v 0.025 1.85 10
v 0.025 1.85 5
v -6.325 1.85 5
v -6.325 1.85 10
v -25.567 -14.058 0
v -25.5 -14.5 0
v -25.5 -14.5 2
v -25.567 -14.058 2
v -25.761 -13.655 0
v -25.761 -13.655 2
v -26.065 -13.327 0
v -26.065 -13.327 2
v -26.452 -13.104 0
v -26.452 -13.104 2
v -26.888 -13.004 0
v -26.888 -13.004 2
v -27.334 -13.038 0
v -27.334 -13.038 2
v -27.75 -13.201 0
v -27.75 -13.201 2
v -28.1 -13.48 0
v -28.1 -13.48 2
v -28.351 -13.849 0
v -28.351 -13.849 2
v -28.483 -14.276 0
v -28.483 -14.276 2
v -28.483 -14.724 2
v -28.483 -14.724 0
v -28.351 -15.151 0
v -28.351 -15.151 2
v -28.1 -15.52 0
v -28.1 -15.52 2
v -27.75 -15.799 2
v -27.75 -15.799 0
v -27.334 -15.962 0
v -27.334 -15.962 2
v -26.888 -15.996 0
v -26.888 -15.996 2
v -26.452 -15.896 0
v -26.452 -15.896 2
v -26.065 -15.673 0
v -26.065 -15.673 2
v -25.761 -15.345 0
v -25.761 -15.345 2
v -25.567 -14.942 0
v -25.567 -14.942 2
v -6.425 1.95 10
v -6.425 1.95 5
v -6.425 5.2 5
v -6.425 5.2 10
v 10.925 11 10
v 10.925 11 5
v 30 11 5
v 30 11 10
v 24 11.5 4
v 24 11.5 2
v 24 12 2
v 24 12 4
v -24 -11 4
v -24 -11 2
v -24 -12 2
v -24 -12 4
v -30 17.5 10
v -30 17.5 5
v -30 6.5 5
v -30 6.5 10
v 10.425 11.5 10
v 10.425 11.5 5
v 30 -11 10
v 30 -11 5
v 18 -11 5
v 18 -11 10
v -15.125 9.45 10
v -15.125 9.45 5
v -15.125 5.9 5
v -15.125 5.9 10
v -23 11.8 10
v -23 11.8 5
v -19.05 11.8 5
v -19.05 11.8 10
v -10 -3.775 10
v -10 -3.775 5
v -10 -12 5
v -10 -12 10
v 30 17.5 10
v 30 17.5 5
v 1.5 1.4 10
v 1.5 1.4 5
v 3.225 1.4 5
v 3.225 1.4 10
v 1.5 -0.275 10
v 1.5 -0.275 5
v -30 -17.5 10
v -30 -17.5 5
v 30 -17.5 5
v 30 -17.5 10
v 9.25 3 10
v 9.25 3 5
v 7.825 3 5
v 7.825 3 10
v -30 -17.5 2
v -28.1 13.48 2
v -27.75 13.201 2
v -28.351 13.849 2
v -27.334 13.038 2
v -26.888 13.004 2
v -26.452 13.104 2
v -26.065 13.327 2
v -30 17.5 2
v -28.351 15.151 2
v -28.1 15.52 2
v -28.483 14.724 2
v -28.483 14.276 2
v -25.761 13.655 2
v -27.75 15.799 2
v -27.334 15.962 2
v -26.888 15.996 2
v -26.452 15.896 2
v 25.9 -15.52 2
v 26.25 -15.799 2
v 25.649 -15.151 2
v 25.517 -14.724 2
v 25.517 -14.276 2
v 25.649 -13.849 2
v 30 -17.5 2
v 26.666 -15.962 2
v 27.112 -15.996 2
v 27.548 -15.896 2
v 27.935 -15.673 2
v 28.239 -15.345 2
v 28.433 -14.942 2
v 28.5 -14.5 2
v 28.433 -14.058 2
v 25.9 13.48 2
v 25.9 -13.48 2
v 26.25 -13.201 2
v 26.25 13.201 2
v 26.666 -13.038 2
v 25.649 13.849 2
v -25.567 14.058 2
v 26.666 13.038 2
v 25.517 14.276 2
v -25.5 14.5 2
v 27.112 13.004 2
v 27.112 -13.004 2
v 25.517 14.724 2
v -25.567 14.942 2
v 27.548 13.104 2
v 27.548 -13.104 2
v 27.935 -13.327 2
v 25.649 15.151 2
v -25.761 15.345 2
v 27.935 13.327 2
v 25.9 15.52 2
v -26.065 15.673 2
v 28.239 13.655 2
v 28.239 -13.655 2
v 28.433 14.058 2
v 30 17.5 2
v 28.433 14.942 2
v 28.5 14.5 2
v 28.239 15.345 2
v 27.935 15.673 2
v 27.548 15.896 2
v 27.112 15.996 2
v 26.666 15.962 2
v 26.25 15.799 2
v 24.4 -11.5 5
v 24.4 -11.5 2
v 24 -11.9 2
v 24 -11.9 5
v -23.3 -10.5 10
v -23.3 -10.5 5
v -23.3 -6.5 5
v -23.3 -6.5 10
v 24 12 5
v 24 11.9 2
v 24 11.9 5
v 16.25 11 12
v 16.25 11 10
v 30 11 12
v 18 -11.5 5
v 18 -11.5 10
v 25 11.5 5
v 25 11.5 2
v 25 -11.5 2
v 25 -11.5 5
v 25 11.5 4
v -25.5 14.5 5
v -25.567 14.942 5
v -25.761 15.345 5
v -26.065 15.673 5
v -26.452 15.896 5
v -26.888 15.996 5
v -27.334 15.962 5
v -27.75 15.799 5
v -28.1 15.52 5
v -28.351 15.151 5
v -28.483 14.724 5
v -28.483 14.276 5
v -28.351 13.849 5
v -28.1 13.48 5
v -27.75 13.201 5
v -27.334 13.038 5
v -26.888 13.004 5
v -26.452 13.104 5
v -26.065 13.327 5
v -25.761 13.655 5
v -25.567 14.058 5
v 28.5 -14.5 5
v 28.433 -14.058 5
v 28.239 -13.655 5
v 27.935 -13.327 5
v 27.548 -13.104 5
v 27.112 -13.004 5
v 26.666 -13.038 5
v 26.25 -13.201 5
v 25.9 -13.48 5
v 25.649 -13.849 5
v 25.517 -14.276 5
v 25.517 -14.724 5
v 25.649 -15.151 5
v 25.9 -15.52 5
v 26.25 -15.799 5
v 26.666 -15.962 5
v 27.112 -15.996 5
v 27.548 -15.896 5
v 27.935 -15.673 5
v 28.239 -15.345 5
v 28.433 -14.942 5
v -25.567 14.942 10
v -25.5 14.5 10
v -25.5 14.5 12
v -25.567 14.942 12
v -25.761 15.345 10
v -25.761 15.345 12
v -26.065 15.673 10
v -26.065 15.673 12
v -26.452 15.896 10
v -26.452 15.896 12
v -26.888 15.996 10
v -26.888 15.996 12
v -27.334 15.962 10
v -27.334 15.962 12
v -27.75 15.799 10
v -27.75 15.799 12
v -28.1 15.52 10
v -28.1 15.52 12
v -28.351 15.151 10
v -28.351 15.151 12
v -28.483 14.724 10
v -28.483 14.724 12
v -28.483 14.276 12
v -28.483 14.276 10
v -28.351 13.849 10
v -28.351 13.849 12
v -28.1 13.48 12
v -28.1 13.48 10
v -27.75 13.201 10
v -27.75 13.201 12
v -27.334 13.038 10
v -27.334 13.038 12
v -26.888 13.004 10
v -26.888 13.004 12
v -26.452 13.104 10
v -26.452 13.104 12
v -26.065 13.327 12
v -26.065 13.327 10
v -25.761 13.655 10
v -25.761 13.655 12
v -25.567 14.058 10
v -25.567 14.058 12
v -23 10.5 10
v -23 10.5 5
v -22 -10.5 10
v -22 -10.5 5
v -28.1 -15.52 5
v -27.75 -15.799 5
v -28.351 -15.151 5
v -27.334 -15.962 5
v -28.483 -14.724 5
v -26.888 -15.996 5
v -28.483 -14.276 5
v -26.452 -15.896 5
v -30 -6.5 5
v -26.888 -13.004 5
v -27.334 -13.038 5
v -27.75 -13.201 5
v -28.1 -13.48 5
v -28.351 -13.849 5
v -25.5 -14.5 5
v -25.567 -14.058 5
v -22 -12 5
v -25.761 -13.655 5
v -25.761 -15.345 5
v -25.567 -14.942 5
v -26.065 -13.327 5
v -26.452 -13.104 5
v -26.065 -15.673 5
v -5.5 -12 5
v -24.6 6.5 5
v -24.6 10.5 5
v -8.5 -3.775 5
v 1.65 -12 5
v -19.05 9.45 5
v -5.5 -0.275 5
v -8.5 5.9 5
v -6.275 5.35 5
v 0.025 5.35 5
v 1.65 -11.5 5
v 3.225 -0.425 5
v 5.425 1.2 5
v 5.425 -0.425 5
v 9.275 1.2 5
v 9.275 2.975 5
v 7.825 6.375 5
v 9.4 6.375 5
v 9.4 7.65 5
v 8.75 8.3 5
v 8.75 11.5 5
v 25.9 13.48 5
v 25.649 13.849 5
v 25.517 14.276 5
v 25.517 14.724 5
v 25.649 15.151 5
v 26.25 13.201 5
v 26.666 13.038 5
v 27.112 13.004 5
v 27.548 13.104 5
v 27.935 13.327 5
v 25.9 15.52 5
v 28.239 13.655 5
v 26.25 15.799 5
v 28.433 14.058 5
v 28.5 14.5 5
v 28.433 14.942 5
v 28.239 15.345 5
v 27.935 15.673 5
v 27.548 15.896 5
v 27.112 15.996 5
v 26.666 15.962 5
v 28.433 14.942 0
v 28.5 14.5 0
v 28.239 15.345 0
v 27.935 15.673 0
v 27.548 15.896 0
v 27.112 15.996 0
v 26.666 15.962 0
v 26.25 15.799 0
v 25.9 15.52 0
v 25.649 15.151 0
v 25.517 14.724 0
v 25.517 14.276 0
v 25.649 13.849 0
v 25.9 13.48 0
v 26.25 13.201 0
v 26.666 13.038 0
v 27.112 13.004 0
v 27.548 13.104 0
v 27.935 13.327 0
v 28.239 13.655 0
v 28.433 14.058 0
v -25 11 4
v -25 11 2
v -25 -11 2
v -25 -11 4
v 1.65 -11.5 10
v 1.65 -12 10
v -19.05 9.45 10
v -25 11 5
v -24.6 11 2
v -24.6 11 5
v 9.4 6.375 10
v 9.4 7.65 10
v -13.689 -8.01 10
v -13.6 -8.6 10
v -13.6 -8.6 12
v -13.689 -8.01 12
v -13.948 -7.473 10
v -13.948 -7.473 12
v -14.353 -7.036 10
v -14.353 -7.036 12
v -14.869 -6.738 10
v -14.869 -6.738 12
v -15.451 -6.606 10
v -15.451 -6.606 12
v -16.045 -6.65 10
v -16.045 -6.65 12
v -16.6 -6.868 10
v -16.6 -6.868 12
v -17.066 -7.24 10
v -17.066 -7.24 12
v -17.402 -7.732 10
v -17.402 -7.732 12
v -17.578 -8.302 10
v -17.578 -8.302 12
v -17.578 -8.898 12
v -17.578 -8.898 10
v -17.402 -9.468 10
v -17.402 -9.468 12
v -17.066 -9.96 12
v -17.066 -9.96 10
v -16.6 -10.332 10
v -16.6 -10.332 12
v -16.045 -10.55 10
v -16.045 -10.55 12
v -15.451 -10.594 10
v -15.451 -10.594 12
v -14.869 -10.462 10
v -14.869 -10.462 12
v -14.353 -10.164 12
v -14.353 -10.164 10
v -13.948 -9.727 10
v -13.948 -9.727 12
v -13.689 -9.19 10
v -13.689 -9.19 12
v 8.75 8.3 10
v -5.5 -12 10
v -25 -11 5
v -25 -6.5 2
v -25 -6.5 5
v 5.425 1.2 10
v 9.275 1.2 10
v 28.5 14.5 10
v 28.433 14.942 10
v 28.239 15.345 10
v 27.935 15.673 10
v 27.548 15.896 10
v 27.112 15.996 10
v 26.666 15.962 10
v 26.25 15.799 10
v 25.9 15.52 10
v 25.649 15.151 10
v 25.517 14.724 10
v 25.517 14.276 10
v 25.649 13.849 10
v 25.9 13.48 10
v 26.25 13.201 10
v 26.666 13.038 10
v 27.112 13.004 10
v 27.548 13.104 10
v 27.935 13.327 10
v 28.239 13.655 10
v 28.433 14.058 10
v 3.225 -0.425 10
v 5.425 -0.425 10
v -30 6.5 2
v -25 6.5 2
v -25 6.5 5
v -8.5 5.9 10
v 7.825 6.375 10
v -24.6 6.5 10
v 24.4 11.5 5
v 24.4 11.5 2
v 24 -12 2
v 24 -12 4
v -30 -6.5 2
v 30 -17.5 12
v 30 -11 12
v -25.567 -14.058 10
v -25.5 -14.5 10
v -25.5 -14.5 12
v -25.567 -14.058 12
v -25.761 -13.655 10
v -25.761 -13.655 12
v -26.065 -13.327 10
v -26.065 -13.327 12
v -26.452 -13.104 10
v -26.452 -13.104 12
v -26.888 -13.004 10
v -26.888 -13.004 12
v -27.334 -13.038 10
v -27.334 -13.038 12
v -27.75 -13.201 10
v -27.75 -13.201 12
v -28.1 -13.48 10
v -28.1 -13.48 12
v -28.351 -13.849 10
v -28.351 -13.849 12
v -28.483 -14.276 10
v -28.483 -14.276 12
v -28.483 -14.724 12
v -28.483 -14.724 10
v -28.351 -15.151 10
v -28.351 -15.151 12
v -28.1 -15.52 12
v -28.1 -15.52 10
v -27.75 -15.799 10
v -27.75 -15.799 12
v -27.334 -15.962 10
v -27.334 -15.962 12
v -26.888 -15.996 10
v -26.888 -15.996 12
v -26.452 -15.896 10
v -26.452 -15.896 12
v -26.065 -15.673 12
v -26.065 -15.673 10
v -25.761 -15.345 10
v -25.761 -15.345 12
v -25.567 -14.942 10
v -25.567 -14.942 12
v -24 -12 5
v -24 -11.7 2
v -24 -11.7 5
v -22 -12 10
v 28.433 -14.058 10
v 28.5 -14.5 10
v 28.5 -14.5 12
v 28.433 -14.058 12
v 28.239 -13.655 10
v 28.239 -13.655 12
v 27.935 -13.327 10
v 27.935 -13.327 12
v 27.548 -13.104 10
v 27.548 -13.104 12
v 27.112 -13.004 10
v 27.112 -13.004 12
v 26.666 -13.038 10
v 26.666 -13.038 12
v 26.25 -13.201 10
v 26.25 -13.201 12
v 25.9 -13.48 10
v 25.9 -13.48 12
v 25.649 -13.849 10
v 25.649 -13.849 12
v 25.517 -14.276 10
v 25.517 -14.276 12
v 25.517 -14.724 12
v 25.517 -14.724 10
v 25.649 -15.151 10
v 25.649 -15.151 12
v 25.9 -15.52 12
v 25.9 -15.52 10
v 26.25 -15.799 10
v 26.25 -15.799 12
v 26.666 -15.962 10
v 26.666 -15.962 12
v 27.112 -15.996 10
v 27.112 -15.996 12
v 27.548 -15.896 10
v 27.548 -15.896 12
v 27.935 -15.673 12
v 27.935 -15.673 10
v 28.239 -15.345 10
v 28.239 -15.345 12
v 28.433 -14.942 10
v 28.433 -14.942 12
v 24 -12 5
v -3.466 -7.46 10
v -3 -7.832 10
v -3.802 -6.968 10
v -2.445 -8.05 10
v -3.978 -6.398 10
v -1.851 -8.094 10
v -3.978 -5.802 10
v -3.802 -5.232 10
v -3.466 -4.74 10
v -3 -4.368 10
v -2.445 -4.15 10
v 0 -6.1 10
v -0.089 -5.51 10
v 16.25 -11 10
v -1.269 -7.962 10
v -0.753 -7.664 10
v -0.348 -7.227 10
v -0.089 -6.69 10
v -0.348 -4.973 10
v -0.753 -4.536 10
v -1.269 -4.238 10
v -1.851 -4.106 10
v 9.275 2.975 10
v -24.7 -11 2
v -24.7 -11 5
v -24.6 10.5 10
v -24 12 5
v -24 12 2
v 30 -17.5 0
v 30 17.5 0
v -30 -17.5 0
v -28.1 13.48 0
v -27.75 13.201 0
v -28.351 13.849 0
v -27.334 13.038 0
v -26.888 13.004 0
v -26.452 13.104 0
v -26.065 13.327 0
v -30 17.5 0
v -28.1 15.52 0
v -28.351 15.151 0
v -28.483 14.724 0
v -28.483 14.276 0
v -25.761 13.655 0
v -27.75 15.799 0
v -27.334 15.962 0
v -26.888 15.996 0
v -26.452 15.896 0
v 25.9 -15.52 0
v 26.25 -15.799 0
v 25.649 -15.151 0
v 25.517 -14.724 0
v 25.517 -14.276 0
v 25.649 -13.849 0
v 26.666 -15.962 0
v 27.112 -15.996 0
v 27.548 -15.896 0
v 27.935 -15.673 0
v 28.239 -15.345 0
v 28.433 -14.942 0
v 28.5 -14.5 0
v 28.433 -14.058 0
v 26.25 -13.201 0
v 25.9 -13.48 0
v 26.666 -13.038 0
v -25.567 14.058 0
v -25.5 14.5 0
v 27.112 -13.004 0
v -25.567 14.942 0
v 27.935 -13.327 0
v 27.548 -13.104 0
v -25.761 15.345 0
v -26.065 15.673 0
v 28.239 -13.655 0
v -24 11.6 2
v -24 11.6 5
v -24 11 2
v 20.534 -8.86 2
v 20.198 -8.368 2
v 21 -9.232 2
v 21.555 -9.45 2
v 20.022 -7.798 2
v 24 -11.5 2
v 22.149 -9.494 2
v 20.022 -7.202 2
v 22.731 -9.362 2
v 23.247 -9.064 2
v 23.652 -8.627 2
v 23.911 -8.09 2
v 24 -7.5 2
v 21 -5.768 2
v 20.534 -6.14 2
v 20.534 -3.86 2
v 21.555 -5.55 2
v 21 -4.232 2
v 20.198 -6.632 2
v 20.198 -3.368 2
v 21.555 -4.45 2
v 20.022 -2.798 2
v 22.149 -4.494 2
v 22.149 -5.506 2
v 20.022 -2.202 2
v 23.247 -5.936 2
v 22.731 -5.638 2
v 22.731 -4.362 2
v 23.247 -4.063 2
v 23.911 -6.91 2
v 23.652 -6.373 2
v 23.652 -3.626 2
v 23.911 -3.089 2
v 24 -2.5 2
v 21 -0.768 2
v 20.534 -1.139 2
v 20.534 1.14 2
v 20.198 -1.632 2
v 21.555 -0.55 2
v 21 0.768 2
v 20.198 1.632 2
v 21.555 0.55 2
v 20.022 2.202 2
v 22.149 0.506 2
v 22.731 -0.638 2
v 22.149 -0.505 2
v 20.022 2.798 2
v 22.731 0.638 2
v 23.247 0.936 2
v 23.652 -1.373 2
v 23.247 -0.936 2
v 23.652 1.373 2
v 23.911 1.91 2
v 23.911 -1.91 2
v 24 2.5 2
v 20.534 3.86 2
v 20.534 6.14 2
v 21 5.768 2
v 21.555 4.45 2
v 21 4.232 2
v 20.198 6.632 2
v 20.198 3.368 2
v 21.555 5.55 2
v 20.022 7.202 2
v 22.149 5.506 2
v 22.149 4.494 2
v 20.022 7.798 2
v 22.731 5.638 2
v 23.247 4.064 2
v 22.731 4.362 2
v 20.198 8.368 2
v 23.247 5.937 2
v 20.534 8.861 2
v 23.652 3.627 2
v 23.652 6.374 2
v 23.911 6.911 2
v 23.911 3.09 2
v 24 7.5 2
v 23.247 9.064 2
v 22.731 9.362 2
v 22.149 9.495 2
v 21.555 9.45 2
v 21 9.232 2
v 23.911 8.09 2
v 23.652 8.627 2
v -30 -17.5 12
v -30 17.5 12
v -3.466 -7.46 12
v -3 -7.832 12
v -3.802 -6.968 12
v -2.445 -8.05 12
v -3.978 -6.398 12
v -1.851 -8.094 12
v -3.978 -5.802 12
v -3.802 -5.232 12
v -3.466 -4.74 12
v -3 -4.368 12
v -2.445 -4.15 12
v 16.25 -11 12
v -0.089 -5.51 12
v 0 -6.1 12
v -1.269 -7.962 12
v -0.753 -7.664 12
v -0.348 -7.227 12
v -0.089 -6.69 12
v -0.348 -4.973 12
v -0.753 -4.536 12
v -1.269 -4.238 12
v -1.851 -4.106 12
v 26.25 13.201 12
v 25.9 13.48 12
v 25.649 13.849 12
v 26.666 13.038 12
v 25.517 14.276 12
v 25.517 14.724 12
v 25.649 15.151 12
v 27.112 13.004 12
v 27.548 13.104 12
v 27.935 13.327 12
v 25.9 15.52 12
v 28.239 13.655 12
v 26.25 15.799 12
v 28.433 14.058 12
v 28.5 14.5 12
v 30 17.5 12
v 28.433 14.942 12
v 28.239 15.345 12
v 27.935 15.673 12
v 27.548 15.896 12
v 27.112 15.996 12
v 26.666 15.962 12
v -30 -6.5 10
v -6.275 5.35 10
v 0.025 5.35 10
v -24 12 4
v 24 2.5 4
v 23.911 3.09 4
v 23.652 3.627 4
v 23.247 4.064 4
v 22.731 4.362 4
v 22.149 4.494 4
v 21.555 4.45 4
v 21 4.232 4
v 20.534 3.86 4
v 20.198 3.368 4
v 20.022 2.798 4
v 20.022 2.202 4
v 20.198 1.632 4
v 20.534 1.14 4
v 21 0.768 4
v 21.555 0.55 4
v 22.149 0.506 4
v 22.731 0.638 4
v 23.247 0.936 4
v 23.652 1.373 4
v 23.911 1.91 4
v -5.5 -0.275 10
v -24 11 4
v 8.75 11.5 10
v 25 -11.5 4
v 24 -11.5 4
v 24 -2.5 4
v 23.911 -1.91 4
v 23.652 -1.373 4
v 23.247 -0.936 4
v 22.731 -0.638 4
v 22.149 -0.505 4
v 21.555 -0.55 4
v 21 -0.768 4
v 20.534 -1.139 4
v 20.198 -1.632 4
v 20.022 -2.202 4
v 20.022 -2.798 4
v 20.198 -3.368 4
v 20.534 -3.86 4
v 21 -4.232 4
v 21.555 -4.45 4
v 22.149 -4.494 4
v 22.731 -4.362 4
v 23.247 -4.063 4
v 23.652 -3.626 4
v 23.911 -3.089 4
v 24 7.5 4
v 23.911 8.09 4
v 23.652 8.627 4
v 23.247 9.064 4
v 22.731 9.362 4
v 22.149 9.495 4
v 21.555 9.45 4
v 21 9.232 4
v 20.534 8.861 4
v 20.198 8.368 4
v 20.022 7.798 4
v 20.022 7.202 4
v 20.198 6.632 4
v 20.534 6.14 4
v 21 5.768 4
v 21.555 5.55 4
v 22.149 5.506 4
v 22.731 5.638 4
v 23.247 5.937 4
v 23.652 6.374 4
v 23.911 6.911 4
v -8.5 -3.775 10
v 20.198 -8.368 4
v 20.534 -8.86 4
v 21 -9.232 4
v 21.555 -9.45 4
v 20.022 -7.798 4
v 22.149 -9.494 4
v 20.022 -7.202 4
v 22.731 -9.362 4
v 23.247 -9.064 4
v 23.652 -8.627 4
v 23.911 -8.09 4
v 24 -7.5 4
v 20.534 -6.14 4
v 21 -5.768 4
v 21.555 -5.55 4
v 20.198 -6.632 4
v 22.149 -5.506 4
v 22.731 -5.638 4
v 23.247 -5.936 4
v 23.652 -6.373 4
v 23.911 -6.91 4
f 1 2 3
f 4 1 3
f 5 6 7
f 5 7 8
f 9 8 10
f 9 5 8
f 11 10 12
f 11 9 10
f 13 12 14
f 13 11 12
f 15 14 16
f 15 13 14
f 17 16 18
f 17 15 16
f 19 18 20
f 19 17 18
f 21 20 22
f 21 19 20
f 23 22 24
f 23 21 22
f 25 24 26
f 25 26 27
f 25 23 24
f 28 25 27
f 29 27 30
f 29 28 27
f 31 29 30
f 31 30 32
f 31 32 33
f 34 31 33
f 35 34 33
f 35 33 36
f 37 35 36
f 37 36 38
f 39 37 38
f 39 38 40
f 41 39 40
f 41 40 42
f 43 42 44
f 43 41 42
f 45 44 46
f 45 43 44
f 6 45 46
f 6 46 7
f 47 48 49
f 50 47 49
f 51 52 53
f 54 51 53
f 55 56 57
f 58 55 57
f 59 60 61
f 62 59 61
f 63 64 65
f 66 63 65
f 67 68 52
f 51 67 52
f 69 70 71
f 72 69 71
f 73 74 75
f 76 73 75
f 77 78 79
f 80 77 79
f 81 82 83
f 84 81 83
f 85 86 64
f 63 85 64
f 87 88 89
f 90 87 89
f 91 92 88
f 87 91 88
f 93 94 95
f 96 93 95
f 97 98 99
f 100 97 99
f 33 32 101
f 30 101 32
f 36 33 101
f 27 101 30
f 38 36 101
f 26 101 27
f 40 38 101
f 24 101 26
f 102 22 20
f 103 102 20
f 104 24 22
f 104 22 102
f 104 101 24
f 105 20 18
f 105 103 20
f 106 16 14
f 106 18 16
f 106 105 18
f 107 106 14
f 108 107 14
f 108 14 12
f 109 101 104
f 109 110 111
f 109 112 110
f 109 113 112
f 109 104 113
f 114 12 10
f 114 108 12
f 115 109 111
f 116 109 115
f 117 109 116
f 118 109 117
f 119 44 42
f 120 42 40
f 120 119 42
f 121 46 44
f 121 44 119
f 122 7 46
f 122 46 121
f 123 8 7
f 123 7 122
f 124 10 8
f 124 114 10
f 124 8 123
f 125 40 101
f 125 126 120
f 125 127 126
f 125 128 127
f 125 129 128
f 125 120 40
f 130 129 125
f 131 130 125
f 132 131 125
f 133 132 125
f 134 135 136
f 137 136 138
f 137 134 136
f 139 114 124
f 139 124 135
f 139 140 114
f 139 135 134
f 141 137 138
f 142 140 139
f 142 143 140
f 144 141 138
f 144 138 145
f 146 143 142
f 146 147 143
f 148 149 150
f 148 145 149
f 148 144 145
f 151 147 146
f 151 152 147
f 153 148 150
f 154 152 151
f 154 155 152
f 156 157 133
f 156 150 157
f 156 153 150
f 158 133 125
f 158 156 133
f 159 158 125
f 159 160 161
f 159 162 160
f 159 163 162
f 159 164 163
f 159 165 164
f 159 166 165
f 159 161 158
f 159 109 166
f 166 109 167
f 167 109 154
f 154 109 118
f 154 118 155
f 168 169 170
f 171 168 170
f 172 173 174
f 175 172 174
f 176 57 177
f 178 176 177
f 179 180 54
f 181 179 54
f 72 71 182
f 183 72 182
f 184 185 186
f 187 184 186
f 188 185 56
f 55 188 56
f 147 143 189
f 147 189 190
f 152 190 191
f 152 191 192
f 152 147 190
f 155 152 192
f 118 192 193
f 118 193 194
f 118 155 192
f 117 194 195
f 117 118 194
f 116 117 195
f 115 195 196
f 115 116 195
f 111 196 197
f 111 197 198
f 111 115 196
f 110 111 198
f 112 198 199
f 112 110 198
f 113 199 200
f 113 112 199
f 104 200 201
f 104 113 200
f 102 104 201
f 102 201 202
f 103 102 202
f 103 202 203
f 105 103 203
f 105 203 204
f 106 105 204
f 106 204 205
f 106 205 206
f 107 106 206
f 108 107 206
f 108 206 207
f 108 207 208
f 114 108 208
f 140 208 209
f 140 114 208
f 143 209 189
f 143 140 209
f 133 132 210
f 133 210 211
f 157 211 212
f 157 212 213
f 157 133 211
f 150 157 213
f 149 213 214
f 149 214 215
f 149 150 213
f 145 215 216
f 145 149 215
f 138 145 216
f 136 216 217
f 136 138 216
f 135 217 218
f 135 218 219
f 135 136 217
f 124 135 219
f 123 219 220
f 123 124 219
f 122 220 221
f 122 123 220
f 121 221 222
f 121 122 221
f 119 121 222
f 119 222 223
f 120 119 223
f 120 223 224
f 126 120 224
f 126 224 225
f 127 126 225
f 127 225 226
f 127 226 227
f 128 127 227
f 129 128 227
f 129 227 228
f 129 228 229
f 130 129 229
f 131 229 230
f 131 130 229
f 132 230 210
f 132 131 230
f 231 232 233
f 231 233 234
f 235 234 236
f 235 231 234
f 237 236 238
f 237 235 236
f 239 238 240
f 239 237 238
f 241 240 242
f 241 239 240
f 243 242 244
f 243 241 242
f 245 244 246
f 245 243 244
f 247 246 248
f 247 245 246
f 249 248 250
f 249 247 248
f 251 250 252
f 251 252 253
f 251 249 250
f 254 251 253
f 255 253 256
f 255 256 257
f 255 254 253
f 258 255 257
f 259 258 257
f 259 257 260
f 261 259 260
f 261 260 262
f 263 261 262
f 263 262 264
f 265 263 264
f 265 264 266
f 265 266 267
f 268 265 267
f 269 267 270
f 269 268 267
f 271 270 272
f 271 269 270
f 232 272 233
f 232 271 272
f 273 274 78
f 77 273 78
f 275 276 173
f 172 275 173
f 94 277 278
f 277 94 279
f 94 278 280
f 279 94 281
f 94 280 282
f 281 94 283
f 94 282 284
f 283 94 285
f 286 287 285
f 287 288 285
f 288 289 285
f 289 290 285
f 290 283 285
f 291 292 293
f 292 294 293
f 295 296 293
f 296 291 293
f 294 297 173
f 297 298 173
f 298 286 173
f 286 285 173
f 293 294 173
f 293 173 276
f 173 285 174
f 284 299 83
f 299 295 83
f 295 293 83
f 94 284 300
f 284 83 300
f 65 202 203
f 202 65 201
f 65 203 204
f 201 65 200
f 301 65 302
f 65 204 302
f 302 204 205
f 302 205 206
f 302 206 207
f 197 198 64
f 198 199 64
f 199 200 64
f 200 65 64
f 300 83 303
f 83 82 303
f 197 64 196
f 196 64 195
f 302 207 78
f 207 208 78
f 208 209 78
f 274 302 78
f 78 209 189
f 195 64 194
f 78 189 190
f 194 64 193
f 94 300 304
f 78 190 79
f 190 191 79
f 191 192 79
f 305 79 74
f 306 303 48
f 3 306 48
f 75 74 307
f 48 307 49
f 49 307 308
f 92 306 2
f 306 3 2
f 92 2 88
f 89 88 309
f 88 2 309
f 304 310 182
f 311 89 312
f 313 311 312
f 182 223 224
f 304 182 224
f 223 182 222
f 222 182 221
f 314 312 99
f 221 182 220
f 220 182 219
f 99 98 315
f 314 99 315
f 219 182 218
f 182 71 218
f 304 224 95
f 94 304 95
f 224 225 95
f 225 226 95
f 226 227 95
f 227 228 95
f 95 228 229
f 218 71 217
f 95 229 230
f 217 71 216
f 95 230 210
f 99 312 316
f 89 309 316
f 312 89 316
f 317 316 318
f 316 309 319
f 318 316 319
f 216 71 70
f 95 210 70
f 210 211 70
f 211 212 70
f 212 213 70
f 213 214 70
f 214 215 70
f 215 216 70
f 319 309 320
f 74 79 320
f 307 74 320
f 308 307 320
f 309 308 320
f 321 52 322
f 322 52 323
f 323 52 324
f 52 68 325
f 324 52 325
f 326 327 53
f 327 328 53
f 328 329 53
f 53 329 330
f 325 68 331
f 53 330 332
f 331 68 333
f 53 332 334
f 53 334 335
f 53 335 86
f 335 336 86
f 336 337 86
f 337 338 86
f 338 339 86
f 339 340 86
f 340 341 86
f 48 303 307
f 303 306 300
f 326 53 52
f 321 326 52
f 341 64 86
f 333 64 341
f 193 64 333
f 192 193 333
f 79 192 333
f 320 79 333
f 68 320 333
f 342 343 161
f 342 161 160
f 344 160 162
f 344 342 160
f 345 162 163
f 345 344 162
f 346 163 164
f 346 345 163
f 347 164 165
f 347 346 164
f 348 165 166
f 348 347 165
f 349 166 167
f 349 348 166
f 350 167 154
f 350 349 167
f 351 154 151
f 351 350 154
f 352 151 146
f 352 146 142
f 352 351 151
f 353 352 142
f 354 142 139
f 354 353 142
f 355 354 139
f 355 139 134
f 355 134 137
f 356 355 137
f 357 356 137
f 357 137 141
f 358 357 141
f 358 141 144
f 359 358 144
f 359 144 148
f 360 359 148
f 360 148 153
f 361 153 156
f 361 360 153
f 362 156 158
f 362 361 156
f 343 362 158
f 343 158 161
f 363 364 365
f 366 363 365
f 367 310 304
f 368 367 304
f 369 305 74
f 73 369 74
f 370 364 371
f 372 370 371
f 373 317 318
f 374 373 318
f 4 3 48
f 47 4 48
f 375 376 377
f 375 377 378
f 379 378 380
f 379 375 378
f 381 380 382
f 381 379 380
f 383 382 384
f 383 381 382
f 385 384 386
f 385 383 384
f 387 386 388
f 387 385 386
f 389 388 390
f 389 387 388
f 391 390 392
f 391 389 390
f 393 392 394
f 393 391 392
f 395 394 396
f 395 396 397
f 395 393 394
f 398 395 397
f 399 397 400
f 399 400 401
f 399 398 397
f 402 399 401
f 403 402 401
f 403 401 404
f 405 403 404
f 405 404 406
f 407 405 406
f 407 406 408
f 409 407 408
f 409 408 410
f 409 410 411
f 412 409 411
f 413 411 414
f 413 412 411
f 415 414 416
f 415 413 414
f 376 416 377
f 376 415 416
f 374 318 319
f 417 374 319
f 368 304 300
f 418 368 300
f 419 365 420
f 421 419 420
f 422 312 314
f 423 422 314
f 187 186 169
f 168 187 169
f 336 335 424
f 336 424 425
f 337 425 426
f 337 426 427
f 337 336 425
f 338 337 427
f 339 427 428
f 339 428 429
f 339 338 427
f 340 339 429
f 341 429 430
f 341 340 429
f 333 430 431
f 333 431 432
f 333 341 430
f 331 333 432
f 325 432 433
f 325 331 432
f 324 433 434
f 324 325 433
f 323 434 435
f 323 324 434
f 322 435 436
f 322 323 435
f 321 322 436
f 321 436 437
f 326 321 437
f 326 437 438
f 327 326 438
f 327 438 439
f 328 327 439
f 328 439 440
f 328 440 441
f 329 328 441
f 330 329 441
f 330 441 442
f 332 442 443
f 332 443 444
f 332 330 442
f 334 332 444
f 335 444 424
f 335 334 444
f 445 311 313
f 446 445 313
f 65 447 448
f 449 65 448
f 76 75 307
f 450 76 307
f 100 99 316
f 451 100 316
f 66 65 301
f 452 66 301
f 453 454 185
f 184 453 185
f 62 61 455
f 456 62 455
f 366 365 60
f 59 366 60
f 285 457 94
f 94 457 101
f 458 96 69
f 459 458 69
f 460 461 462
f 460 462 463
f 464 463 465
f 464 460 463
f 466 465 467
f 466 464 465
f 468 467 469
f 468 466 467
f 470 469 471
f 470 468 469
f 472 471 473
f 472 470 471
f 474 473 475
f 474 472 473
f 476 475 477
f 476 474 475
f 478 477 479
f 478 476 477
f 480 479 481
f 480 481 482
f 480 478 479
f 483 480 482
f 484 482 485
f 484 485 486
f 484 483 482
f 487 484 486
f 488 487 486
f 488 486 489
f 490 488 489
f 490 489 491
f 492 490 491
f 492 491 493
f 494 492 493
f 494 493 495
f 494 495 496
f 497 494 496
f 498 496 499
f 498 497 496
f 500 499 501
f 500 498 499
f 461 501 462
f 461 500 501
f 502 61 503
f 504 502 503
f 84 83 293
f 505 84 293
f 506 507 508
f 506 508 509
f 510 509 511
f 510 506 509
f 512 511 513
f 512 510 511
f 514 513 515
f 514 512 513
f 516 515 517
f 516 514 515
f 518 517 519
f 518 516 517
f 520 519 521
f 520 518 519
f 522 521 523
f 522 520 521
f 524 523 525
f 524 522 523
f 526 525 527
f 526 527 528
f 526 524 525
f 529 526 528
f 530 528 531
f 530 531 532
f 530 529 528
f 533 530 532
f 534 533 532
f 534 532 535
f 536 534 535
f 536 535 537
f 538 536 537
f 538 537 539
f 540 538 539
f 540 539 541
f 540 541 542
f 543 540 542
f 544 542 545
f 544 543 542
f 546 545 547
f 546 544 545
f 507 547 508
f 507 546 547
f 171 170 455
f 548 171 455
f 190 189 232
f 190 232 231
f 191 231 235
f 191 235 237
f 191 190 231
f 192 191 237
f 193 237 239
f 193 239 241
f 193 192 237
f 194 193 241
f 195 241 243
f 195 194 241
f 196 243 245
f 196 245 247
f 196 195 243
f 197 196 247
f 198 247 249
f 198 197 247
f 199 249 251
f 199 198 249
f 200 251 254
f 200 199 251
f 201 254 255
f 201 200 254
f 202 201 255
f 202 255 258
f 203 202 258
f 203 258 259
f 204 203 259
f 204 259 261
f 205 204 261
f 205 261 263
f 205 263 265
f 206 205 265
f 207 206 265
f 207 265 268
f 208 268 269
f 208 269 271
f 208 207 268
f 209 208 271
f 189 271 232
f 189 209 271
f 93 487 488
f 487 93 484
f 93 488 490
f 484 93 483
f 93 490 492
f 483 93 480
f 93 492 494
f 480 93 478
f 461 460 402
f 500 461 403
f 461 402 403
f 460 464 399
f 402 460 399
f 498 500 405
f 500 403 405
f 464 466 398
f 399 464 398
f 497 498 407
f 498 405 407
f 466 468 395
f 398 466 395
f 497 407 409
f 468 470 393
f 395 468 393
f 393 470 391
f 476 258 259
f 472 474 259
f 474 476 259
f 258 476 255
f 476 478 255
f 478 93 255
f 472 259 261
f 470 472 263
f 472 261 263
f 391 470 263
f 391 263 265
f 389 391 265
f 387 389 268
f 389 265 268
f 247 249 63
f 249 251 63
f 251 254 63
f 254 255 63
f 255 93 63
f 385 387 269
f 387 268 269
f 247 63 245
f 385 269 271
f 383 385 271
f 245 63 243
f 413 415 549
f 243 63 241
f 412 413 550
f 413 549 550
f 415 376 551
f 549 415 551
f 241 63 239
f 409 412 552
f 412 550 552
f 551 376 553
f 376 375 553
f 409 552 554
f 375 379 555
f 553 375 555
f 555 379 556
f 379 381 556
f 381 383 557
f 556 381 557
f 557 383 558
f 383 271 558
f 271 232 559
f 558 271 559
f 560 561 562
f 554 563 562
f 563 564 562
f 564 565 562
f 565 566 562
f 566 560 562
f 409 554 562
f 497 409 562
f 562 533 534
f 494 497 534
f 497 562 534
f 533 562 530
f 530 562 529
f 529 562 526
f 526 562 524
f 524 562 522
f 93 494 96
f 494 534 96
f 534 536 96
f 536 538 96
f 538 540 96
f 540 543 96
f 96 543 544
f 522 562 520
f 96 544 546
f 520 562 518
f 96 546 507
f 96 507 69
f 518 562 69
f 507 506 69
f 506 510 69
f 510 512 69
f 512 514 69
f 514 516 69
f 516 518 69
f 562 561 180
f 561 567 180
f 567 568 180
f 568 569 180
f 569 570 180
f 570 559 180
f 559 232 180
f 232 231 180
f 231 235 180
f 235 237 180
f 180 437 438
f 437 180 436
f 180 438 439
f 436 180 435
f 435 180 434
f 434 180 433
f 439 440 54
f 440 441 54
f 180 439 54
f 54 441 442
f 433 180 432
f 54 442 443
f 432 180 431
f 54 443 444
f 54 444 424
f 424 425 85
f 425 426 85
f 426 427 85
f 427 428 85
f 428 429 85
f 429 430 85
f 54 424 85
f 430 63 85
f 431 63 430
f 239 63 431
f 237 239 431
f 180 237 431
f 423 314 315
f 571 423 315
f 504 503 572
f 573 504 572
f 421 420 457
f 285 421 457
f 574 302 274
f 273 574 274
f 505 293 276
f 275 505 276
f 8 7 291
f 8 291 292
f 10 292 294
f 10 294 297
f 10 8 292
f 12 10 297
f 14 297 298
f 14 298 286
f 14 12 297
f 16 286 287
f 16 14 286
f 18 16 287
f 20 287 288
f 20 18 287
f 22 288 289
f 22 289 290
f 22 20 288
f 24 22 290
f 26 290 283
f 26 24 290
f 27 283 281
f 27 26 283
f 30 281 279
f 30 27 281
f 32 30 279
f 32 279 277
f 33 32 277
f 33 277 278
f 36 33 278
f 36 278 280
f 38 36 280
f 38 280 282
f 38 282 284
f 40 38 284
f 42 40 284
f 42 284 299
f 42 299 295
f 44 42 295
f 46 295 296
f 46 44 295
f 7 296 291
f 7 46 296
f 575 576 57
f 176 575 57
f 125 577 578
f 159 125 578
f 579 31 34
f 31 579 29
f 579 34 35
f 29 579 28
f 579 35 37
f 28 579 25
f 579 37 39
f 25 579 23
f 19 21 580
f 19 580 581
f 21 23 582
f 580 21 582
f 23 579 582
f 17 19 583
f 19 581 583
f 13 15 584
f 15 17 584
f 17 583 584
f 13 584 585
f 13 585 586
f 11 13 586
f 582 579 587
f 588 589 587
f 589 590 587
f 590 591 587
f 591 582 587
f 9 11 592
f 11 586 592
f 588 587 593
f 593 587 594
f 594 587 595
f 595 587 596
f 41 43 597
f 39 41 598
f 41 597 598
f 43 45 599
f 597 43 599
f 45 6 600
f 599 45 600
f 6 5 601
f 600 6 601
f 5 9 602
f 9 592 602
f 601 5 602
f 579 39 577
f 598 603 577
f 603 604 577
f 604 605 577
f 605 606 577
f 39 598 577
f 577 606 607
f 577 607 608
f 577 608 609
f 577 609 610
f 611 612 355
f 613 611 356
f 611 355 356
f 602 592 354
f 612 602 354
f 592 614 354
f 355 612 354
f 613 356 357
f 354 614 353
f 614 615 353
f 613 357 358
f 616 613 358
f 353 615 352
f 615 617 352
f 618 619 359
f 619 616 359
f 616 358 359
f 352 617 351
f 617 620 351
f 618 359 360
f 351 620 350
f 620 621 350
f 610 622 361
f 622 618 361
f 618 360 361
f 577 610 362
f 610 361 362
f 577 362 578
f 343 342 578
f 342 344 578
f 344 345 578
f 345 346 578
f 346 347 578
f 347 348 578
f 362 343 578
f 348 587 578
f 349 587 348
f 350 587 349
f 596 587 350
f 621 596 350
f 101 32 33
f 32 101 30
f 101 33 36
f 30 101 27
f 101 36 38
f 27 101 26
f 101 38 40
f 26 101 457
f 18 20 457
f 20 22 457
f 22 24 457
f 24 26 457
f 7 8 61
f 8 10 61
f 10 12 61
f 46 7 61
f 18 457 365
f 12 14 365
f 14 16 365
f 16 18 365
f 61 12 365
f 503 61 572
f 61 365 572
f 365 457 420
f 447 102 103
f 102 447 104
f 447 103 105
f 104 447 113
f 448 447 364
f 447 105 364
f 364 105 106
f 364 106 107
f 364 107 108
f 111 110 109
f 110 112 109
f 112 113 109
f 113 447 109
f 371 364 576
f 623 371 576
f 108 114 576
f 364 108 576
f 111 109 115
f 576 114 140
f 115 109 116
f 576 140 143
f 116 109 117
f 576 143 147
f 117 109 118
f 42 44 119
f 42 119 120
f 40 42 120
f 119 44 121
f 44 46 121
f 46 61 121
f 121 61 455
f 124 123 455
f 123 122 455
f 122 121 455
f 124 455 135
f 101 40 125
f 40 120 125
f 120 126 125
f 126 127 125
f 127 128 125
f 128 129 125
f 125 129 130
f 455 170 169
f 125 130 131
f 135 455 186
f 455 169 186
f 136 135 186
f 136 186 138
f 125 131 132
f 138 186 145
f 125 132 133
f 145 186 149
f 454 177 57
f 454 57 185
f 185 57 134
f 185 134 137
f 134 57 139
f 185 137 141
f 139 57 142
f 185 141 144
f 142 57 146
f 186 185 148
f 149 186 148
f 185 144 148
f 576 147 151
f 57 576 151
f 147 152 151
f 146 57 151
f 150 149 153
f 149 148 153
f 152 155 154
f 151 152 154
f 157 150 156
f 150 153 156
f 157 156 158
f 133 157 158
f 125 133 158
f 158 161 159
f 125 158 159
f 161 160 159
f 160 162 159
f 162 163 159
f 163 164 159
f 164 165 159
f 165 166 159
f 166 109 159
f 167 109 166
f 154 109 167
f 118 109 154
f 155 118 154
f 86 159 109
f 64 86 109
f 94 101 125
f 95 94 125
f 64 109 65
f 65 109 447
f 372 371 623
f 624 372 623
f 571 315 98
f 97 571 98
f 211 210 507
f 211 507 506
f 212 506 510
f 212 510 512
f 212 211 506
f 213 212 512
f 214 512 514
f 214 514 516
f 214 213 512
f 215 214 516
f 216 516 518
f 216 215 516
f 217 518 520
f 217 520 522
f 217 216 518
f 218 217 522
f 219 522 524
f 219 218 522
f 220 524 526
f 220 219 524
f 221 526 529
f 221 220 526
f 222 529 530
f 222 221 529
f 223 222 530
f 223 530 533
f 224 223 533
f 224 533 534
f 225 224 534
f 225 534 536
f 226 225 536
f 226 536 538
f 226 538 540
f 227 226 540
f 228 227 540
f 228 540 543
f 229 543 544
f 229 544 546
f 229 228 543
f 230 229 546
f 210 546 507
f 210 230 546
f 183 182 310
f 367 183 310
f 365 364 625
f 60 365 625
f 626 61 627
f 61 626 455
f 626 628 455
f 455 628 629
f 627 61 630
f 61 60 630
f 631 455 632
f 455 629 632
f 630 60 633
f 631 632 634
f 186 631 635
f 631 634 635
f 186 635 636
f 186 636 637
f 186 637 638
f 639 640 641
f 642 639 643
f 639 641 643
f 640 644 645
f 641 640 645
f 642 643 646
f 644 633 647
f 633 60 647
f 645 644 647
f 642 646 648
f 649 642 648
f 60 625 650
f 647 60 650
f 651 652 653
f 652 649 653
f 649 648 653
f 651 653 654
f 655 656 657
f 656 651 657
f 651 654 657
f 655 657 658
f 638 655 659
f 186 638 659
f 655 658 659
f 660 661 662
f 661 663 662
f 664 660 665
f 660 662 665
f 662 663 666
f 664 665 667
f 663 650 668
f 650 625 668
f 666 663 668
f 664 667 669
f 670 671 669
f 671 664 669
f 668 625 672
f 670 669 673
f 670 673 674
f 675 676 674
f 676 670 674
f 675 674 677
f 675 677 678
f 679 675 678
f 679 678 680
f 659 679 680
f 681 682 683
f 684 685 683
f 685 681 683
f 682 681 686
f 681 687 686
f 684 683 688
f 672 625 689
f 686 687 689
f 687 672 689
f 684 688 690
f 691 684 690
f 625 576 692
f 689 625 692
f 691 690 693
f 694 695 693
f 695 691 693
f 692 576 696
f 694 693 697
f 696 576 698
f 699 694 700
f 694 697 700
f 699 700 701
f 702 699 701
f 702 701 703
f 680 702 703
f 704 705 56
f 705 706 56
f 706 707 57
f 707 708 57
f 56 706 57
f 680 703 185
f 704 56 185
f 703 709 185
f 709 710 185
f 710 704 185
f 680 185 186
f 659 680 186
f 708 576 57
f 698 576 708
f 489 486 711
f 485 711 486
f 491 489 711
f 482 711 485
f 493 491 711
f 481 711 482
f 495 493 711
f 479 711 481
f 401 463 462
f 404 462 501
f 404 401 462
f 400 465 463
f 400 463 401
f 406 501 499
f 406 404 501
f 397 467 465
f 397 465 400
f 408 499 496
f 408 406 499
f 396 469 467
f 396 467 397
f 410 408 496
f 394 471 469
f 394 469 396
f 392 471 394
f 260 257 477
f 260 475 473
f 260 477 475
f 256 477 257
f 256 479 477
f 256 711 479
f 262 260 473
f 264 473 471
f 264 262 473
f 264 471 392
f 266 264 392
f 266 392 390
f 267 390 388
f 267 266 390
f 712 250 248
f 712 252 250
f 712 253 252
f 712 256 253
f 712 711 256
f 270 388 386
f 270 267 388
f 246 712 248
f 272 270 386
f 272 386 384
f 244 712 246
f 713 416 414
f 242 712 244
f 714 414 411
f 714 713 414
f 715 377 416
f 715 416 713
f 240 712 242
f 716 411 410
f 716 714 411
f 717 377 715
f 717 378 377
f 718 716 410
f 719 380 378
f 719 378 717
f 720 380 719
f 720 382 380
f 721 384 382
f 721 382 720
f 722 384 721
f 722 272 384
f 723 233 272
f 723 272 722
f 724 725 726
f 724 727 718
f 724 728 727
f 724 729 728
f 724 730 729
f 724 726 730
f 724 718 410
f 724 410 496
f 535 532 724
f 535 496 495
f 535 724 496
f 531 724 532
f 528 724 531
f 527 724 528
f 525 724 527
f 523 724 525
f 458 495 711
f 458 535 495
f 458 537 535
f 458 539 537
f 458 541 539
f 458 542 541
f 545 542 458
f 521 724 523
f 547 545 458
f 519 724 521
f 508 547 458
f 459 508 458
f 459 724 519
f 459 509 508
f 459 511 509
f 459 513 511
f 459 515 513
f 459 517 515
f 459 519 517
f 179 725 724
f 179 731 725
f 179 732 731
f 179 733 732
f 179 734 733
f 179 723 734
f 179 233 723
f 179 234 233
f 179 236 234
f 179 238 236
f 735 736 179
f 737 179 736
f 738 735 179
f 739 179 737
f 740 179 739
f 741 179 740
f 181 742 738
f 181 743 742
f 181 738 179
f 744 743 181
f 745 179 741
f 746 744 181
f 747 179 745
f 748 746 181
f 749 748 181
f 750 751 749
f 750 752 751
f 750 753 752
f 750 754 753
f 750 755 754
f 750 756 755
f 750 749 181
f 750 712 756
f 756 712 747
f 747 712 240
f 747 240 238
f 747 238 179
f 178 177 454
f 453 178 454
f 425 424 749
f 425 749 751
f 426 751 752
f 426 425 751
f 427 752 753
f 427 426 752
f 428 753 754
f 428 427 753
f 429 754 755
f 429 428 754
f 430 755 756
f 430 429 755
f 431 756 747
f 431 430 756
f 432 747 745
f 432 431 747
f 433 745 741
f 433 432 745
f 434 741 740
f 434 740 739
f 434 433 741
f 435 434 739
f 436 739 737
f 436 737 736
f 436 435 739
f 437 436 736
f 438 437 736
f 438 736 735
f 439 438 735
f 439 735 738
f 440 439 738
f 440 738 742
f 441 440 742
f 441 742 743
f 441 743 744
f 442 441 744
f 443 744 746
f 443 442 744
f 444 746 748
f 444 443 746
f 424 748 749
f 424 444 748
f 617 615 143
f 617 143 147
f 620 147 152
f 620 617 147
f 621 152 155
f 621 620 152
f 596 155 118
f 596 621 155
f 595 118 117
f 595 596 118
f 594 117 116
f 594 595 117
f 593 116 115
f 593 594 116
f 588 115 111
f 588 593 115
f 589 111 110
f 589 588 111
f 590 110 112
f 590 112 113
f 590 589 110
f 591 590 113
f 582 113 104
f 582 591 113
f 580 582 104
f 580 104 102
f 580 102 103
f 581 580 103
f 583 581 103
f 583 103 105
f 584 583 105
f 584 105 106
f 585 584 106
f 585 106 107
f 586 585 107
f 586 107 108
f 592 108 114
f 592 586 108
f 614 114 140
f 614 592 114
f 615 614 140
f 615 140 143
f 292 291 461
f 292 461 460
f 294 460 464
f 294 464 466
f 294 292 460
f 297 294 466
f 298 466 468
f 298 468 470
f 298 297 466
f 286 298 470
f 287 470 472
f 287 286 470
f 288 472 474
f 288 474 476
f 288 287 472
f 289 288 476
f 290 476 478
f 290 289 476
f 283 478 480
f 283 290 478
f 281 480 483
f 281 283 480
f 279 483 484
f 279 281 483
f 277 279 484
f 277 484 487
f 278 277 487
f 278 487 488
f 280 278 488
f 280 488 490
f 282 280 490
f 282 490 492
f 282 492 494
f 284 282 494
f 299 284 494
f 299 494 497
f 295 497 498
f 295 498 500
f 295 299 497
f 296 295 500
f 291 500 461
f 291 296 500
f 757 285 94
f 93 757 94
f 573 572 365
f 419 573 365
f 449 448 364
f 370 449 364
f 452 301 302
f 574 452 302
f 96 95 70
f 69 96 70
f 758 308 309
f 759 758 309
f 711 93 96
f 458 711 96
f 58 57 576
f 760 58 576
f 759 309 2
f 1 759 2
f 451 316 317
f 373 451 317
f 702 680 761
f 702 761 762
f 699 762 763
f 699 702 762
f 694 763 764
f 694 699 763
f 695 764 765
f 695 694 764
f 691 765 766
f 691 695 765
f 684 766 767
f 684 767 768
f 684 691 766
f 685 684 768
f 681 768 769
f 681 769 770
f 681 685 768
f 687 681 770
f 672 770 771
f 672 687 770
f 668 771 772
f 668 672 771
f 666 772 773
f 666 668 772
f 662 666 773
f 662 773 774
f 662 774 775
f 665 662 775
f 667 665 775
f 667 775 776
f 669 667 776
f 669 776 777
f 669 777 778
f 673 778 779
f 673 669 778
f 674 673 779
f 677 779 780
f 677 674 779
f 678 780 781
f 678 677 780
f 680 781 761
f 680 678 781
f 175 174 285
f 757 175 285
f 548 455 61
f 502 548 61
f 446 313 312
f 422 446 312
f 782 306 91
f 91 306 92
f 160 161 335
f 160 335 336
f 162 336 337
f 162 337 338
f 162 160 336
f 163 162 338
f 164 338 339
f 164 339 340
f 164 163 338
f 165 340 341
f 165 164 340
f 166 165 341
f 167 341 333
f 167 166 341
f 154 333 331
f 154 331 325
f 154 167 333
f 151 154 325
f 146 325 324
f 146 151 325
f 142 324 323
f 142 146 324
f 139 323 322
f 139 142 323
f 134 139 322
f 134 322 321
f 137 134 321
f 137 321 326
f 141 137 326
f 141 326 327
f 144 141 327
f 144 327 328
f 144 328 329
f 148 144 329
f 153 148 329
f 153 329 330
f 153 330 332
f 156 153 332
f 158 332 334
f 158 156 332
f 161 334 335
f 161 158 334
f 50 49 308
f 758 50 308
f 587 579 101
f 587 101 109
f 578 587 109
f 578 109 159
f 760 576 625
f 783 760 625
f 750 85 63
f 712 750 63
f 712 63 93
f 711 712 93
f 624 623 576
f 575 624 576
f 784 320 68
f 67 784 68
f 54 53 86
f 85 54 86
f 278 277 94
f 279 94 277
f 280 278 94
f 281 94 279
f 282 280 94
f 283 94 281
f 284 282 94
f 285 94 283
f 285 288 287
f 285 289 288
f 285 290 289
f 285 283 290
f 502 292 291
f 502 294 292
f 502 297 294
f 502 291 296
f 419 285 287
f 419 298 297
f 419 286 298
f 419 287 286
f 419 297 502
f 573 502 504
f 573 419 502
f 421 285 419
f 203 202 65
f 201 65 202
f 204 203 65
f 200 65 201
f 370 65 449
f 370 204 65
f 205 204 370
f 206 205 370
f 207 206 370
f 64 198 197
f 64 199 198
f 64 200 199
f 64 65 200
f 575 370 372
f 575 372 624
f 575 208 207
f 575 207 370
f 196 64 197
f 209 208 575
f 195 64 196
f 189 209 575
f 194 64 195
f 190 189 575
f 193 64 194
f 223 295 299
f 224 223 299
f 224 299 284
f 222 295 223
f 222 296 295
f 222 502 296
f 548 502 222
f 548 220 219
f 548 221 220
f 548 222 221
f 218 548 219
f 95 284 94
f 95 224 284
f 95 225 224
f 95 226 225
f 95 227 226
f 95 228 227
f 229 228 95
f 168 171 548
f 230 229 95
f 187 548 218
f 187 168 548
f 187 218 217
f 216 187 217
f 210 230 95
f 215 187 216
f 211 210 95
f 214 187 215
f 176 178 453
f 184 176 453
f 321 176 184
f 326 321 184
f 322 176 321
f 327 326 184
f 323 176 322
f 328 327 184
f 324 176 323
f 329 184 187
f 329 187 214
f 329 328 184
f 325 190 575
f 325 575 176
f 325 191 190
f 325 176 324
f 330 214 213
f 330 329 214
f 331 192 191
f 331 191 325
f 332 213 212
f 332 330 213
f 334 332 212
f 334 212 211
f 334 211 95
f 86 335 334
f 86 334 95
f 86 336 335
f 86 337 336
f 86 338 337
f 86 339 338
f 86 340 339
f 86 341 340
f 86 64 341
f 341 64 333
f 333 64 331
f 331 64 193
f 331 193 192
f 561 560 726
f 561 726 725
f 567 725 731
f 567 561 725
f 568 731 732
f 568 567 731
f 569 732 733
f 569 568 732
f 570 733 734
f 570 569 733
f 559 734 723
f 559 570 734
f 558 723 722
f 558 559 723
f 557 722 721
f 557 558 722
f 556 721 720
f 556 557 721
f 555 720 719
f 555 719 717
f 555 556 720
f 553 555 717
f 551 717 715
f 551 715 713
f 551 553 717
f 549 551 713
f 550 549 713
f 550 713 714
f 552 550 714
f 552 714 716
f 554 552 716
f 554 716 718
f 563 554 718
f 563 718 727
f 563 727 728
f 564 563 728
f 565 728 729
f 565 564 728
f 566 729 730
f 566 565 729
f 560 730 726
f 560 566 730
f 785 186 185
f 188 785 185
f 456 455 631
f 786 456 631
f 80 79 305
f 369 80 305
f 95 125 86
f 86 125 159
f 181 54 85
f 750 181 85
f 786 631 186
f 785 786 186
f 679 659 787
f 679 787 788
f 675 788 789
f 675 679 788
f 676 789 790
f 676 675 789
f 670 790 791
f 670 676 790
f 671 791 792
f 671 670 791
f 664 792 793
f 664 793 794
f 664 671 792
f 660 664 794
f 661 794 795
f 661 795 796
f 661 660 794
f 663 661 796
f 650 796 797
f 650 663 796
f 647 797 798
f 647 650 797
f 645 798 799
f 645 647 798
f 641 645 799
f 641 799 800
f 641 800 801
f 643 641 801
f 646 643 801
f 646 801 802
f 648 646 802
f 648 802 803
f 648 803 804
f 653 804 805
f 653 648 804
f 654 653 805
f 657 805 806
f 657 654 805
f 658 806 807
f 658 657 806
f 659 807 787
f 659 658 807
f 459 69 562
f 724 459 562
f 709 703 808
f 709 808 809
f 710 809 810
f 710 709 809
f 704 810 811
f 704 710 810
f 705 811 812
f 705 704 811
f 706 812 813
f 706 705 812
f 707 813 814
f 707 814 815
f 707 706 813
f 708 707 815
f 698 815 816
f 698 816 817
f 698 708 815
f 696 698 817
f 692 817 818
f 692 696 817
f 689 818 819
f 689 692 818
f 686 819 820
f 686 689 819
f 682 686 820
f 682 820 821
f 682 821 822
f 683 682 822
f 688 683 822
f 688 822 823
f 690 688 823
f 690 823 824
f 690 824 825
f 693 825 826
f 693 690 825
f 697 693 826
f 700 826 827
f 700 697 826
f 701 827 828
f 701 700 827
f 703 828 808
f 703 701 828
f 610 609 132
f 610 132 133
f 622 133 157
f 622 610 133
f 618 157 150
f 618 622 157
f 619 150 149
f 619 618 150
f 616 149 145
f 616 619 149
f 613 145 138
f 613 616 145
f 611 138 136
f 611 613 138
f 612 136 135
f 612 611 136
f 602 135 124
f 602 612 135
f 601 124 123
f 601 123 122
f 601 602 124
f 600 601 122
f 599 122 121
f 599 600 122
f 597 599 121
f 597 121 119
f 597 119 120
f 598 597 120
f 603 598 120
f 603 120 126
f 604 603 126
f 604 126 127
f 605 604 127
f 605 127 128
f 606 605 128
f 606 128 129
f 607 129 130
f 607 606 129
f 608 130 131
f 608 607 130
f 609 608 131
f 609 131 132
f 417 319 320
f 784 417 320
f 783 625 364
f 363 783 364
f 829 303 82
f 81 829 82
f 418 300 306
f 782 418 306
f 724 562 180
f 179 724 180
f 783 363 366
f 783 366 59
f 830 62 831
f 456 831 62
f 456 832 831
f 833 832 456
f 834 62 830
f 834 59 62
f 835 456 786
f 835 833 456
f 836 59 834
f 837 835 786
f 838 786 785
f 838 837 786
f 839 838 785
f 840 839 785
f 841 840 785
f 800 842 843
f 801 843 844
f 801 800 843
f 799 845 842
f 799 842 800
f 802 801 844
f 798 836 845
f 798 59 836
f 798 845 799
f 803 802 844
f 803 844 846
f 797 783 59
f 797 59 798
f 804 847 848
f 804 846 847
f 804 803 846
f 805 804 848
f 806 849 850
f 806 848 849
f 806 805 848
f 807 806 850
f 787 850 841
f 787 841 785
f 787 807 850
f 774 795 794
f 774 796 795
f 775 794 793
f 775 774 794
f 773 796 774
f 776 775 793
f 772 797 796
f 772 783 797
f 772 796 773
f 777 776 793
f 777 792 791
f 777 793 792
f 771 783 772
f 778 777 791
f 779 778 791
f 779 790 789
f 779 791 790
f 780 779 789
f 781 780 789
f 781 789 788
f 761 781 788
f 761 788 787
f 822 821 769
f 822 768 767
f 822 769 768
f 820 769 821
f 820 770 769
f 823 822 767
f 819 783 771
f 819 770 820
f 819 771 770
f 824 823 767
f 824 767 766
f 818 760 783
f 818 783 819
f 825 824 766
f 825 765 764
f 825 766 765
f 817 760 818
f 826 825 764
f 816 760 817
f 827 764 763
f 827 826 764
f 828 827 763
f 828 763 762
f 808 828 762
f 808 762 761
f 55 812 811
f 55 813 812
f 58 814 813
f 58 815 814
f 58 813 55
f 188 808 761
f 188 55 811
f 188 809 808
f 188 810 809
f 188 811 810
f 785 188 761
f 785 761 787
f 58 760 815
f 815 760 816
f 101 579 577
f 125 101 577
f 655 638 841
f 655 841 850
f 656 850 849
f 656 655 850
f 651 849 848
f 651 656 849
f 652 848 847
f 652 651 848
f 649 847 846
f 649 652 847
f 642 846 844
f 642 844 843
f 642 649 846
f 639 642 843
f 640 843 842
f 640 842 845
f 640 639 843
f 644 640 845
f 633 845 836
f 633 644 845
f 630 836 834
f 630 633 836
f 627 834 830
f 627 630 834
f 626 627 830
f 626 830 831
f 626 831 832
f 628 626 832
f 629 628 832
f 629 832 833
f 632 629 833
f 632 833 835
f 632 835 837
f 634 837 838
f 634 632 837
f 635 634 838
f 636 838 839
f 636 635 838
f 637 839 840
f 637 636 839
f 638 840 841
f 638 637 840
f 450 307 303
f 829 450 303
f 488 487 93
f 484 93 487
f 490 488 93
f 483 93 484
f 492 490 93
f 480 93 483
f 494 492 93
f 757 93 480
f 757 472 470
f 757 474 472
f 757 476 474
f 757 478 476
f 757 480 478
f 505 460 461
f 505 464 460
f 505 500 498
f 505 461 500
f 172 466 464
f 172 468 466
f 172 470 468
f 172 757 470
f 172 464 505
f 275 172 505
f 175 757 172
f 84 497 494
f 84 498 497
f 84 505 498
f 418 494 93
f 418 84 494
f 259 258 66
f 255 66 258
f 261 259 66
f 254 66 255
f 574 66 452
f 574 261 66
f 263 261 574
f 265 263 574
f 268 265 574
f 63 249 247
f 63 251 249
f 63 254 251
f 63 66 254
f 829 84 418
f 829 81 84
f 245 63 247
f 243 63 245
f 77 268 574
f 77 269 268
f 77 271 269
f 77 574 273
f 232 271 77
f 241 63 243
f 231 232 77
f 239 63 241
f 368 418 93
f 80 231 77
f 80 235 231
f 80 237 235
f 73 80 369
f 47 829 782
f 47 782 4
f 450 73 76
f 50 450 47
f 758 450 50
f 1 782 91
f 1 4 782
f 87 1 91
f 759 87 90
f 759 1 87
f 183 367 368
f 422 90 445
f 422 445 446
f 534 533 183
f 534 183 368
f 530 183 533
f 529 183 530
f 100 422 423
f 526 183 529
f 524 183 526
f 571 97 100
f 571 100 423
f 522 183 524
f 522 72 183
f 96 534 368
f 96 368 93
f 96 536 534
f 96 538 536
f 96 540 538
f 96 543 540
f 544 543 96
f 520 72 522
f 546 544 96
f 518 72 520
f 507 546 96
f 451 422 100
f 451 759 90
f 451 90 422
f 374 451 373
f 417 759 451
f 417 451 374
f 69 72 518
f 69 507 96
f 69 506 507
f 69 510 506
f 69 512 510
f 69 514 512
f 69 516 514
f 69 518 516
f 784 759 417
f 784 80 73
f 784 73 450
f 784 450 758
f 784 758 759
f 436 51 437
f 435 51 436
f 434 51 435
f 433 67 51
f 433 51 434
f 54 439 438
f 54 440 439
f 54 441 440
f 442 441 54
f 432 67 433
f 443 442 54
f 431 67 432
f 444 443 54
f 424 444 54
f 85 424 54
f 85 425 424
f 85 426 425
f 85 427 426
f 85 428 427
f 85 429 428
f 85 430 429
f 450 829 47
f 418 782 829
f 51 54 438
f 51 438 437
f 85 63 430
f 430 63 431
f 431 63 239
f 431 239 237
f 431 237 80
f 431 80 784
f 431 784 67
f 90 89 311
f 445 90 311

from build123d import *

# Parameters (mm, degrees)
F0_W      = 60
F0_H      = 35.000001
F0_R      = 1.5
F1_DEPTH  = 2
F3_R      = 1.5
F4_DEPTH  = 3
F5_R      = 2.000001
F6_DEPTH  = 2
F8_R      = 1.5
F9_DEPTH  = 5
F11_R     = 1.5
F11_R_2   = 2.000001
F12_DEPTH = 2


with BuildPart() as f1:
    # F0 (on Top) → F1 (new body)
    with BuildSketch(Plane.XY):
        with Locations((0, -5e-07)):
            Rectangle(F0_W, F0_H)
        with Locations((-27.000001, -14.500002)):
            Circle(F0_R, mode=Mode.SUBTRACT)
        with Locations((27, -14.500002)):
            Circle(F0_R, mode=Mode.SUBTRACT)
        with Locations((-27.000001, 14.499999)):
            Circle(F0_R, mode=Mode.SUBTRACT)
        with Locations((27, 14.499999)):
            Circle(F0_R, mode=Mode.SUBTRACT)
    extrude(amount=F1_DEPTH)


with BuildPart() as f4:
    # F3 (on offset) → F4 (new body)
    with BuildSketch(Plane.XY.offset(2)):
        Polygon((24.000001, -11.899999), (24.000001, -12.000002), (-23.999999, -12.000002), (-23.999999, -11.700002), (-24.7, -11.000001), (-25, -11.000001), (-25, -6.5), (-30, -6.5), (-30, -17.500001), (30, -17.500001), (30, 11.000001), (30, 17.5), (-30, 17.5), (-30, 6.499999), (-25, 6.499999), (-25, 10.999998), (-24.6, 10.999998), (-23.999999, 11.599999), (-23.999999, 11.999999), (24.000001, 11.999999), (24.000001, 11.899999), (24.400001, 11.5), (24.999999, 11.5), (24.999999, -11.5), (24.400001, -11.5), align=None)
        with Locations((-27.000001, -14.500002)):
            Circle(F3_R, mode=Mode.SUBTRACT)
        with Locations((27, -14.500002)):
            Circle(F3_R, mode=Mode.SUBTRACT)
        with Locations((-27.000001, 14.499999)):
            Circle(F3_R, mode=Mode.SUBTRACT)
        with Locations((27, 14.499999)):
            Circle(F3_R, mode=Mode.SUBTRACT)
    extrude(amount=F4_DEPTH)


with BuildPart() as f6:
    # F5 (on offset) → F6 (new body)
    with BuildSketch(Plane.XY.offset(2)):
        Polygon((-23.999999, -10.999999), (-23.999999, -12), (24.000001, -12), (24.000001, -11.499998), (24.999999, -11.499998), (24.999999, 11.500002), (24.000001, 11.500002), (24.000001, 12.000001), (-23.999999, 12.000001), (-23.999999, 11), (-25, 11), (-25, -10.999999), align=None)
        with Locations((22, -7.499999)):
            Circle(F5_R, mode=Mode.SUBTRACT)
        with Locations((22, -2.499755)):
            Circle(F5_R, mode=Mode.SUBTRACT)
        with Locations((22, 2.500002)):
            Circle(F5_R, mode=Mode.SUBTRACT)
        with Locations((22, 7.500246)):
            Circle(F5_R, mode=Mode.SUBTRACT)
    extrude(amount=F6_DEPTH)


with BuildPart() as f9:
    # F8 (on offset) → F9 (new body)
    with BuildSketch(Plane.XY.offset(5)):
        Polygon((-22.999999, 10.499999), (-22.999999, 11.799999), (-19.049999, 11.799999), (-19.049999, 9.449999), (-15.125, 9.449999), (-15.125, 5.899998), (-8.5, 5.899998), (-8.5, -1.5), (-8.5, -3.775002), (-9.999999, -3.775002), (-9.999999, -4.900001), (-9.999999, -12.000002), (-22.000001, -12.000002), (-22.000001, -10.5), (-23.300001, -10.5), (-23.300001, -6.5), (-30, -6.5), (-30, -17.500001), (30, -17.500001), (30, -11.000001), (18.000001, -11.000001), (18.000001, -11.5), (15.500001, -11.5), (10.000001, -11.5), (2.750001, -11.5), (1.65, -11.5), (1.65, -12.000002), (1.399998, -12.000002), (-5.500001, -12.000002), (-5.500001, -0.950001), (-5.500001, -0.275001), (1.500001, -0.275001), (1.500001, 1.399999), (3.225001, 1.399999), (3.225001, -0.425001), (5.424999, -0.425001), (5.424999, 1.199997), (5.65, 1.199997), (9.274999, 1.199997), (9.274999, 2.974998), (9.249998, 2.999999), (7.824999, 2.999999), (7.824999, 6.374998), (9.4, 6.374998), (9.4, 7.649997), (8.750001, 8.299996), (8.750001, 11.5), (10.424999, 11.5), (10.924998, 11.000001), (17.2, 11.000001), (30, 11.000001), (30, 17.5), (-30, 17.5), (-30, 6.499999), (-26, 6.499999), (-24.6, 6.499999), (-24.6, 10.499999), align=None)
        with Locations((-27.000001, -14.500002)):
            Circle(F8_R, mode=Mode.SUBTRACT)
        with Locations((27, -14.500002)):
            Circle(F8_R, mode=Mode.SUBTRACT)
        Polygon((0.025, 5.349997), (0.025, 1.849996), (-6.324998, 1.849996), (-6.424997, 1.949996), (-6.424997, 5.199997), (-6.274998, 5.349997), align=None, mode=Mode.SUBTRACT)
        with Locations((-27.000001, 14.499999)):
            Circle(F8_R, mode=Mode.SUBTRACT)
        with Locations((27, 14.499999)):
            Circle(F8_R, mode=Mode.SUBTRACT)
    extrude(amount=F9_DEPTH)


with BuildPart() as f12:
    # F11 (on offset) → F12 (new body)
    with BuildSketch(Plane.XY.offset(10)):
        Polygon((-30, 17.5), (-30, -17.500001), (30, -17.500001), (30, -11.000001), (16.249999, -11.000001), (16.249999, 11.000001), (30, 11.000001), (30, 17.5), align=None)
        with Locations((-27.000001, -14.500002)):
            Circle(F11_R, mode=Mode.SUBTRACT)
        with Locations((-15.600001, -8.600001)):
            Circle(F11_R_2, mode=Mode.SUBTRACT)
        with Locations((-2, -6.100001)):
            Circle(F11_R_2, mode=Mode.SUBTRACT)
        with Locations((27, -14.500002)):
            Circle(F11_R, mode=Mode.SUBTRACT)
        with Locations((-27.000001, 14.499999)):
            Circle(F11_R, mode=Mode.SUBTRACT)
        with Locations((27, 14.499999)):
            Circle(F11_R, mode=Mode.SUBTRACT)
    extrude(amount=F12_DEPTH)


solid = Compound([f1.part, f4.part, f6.part, f9.part, f12.part])
